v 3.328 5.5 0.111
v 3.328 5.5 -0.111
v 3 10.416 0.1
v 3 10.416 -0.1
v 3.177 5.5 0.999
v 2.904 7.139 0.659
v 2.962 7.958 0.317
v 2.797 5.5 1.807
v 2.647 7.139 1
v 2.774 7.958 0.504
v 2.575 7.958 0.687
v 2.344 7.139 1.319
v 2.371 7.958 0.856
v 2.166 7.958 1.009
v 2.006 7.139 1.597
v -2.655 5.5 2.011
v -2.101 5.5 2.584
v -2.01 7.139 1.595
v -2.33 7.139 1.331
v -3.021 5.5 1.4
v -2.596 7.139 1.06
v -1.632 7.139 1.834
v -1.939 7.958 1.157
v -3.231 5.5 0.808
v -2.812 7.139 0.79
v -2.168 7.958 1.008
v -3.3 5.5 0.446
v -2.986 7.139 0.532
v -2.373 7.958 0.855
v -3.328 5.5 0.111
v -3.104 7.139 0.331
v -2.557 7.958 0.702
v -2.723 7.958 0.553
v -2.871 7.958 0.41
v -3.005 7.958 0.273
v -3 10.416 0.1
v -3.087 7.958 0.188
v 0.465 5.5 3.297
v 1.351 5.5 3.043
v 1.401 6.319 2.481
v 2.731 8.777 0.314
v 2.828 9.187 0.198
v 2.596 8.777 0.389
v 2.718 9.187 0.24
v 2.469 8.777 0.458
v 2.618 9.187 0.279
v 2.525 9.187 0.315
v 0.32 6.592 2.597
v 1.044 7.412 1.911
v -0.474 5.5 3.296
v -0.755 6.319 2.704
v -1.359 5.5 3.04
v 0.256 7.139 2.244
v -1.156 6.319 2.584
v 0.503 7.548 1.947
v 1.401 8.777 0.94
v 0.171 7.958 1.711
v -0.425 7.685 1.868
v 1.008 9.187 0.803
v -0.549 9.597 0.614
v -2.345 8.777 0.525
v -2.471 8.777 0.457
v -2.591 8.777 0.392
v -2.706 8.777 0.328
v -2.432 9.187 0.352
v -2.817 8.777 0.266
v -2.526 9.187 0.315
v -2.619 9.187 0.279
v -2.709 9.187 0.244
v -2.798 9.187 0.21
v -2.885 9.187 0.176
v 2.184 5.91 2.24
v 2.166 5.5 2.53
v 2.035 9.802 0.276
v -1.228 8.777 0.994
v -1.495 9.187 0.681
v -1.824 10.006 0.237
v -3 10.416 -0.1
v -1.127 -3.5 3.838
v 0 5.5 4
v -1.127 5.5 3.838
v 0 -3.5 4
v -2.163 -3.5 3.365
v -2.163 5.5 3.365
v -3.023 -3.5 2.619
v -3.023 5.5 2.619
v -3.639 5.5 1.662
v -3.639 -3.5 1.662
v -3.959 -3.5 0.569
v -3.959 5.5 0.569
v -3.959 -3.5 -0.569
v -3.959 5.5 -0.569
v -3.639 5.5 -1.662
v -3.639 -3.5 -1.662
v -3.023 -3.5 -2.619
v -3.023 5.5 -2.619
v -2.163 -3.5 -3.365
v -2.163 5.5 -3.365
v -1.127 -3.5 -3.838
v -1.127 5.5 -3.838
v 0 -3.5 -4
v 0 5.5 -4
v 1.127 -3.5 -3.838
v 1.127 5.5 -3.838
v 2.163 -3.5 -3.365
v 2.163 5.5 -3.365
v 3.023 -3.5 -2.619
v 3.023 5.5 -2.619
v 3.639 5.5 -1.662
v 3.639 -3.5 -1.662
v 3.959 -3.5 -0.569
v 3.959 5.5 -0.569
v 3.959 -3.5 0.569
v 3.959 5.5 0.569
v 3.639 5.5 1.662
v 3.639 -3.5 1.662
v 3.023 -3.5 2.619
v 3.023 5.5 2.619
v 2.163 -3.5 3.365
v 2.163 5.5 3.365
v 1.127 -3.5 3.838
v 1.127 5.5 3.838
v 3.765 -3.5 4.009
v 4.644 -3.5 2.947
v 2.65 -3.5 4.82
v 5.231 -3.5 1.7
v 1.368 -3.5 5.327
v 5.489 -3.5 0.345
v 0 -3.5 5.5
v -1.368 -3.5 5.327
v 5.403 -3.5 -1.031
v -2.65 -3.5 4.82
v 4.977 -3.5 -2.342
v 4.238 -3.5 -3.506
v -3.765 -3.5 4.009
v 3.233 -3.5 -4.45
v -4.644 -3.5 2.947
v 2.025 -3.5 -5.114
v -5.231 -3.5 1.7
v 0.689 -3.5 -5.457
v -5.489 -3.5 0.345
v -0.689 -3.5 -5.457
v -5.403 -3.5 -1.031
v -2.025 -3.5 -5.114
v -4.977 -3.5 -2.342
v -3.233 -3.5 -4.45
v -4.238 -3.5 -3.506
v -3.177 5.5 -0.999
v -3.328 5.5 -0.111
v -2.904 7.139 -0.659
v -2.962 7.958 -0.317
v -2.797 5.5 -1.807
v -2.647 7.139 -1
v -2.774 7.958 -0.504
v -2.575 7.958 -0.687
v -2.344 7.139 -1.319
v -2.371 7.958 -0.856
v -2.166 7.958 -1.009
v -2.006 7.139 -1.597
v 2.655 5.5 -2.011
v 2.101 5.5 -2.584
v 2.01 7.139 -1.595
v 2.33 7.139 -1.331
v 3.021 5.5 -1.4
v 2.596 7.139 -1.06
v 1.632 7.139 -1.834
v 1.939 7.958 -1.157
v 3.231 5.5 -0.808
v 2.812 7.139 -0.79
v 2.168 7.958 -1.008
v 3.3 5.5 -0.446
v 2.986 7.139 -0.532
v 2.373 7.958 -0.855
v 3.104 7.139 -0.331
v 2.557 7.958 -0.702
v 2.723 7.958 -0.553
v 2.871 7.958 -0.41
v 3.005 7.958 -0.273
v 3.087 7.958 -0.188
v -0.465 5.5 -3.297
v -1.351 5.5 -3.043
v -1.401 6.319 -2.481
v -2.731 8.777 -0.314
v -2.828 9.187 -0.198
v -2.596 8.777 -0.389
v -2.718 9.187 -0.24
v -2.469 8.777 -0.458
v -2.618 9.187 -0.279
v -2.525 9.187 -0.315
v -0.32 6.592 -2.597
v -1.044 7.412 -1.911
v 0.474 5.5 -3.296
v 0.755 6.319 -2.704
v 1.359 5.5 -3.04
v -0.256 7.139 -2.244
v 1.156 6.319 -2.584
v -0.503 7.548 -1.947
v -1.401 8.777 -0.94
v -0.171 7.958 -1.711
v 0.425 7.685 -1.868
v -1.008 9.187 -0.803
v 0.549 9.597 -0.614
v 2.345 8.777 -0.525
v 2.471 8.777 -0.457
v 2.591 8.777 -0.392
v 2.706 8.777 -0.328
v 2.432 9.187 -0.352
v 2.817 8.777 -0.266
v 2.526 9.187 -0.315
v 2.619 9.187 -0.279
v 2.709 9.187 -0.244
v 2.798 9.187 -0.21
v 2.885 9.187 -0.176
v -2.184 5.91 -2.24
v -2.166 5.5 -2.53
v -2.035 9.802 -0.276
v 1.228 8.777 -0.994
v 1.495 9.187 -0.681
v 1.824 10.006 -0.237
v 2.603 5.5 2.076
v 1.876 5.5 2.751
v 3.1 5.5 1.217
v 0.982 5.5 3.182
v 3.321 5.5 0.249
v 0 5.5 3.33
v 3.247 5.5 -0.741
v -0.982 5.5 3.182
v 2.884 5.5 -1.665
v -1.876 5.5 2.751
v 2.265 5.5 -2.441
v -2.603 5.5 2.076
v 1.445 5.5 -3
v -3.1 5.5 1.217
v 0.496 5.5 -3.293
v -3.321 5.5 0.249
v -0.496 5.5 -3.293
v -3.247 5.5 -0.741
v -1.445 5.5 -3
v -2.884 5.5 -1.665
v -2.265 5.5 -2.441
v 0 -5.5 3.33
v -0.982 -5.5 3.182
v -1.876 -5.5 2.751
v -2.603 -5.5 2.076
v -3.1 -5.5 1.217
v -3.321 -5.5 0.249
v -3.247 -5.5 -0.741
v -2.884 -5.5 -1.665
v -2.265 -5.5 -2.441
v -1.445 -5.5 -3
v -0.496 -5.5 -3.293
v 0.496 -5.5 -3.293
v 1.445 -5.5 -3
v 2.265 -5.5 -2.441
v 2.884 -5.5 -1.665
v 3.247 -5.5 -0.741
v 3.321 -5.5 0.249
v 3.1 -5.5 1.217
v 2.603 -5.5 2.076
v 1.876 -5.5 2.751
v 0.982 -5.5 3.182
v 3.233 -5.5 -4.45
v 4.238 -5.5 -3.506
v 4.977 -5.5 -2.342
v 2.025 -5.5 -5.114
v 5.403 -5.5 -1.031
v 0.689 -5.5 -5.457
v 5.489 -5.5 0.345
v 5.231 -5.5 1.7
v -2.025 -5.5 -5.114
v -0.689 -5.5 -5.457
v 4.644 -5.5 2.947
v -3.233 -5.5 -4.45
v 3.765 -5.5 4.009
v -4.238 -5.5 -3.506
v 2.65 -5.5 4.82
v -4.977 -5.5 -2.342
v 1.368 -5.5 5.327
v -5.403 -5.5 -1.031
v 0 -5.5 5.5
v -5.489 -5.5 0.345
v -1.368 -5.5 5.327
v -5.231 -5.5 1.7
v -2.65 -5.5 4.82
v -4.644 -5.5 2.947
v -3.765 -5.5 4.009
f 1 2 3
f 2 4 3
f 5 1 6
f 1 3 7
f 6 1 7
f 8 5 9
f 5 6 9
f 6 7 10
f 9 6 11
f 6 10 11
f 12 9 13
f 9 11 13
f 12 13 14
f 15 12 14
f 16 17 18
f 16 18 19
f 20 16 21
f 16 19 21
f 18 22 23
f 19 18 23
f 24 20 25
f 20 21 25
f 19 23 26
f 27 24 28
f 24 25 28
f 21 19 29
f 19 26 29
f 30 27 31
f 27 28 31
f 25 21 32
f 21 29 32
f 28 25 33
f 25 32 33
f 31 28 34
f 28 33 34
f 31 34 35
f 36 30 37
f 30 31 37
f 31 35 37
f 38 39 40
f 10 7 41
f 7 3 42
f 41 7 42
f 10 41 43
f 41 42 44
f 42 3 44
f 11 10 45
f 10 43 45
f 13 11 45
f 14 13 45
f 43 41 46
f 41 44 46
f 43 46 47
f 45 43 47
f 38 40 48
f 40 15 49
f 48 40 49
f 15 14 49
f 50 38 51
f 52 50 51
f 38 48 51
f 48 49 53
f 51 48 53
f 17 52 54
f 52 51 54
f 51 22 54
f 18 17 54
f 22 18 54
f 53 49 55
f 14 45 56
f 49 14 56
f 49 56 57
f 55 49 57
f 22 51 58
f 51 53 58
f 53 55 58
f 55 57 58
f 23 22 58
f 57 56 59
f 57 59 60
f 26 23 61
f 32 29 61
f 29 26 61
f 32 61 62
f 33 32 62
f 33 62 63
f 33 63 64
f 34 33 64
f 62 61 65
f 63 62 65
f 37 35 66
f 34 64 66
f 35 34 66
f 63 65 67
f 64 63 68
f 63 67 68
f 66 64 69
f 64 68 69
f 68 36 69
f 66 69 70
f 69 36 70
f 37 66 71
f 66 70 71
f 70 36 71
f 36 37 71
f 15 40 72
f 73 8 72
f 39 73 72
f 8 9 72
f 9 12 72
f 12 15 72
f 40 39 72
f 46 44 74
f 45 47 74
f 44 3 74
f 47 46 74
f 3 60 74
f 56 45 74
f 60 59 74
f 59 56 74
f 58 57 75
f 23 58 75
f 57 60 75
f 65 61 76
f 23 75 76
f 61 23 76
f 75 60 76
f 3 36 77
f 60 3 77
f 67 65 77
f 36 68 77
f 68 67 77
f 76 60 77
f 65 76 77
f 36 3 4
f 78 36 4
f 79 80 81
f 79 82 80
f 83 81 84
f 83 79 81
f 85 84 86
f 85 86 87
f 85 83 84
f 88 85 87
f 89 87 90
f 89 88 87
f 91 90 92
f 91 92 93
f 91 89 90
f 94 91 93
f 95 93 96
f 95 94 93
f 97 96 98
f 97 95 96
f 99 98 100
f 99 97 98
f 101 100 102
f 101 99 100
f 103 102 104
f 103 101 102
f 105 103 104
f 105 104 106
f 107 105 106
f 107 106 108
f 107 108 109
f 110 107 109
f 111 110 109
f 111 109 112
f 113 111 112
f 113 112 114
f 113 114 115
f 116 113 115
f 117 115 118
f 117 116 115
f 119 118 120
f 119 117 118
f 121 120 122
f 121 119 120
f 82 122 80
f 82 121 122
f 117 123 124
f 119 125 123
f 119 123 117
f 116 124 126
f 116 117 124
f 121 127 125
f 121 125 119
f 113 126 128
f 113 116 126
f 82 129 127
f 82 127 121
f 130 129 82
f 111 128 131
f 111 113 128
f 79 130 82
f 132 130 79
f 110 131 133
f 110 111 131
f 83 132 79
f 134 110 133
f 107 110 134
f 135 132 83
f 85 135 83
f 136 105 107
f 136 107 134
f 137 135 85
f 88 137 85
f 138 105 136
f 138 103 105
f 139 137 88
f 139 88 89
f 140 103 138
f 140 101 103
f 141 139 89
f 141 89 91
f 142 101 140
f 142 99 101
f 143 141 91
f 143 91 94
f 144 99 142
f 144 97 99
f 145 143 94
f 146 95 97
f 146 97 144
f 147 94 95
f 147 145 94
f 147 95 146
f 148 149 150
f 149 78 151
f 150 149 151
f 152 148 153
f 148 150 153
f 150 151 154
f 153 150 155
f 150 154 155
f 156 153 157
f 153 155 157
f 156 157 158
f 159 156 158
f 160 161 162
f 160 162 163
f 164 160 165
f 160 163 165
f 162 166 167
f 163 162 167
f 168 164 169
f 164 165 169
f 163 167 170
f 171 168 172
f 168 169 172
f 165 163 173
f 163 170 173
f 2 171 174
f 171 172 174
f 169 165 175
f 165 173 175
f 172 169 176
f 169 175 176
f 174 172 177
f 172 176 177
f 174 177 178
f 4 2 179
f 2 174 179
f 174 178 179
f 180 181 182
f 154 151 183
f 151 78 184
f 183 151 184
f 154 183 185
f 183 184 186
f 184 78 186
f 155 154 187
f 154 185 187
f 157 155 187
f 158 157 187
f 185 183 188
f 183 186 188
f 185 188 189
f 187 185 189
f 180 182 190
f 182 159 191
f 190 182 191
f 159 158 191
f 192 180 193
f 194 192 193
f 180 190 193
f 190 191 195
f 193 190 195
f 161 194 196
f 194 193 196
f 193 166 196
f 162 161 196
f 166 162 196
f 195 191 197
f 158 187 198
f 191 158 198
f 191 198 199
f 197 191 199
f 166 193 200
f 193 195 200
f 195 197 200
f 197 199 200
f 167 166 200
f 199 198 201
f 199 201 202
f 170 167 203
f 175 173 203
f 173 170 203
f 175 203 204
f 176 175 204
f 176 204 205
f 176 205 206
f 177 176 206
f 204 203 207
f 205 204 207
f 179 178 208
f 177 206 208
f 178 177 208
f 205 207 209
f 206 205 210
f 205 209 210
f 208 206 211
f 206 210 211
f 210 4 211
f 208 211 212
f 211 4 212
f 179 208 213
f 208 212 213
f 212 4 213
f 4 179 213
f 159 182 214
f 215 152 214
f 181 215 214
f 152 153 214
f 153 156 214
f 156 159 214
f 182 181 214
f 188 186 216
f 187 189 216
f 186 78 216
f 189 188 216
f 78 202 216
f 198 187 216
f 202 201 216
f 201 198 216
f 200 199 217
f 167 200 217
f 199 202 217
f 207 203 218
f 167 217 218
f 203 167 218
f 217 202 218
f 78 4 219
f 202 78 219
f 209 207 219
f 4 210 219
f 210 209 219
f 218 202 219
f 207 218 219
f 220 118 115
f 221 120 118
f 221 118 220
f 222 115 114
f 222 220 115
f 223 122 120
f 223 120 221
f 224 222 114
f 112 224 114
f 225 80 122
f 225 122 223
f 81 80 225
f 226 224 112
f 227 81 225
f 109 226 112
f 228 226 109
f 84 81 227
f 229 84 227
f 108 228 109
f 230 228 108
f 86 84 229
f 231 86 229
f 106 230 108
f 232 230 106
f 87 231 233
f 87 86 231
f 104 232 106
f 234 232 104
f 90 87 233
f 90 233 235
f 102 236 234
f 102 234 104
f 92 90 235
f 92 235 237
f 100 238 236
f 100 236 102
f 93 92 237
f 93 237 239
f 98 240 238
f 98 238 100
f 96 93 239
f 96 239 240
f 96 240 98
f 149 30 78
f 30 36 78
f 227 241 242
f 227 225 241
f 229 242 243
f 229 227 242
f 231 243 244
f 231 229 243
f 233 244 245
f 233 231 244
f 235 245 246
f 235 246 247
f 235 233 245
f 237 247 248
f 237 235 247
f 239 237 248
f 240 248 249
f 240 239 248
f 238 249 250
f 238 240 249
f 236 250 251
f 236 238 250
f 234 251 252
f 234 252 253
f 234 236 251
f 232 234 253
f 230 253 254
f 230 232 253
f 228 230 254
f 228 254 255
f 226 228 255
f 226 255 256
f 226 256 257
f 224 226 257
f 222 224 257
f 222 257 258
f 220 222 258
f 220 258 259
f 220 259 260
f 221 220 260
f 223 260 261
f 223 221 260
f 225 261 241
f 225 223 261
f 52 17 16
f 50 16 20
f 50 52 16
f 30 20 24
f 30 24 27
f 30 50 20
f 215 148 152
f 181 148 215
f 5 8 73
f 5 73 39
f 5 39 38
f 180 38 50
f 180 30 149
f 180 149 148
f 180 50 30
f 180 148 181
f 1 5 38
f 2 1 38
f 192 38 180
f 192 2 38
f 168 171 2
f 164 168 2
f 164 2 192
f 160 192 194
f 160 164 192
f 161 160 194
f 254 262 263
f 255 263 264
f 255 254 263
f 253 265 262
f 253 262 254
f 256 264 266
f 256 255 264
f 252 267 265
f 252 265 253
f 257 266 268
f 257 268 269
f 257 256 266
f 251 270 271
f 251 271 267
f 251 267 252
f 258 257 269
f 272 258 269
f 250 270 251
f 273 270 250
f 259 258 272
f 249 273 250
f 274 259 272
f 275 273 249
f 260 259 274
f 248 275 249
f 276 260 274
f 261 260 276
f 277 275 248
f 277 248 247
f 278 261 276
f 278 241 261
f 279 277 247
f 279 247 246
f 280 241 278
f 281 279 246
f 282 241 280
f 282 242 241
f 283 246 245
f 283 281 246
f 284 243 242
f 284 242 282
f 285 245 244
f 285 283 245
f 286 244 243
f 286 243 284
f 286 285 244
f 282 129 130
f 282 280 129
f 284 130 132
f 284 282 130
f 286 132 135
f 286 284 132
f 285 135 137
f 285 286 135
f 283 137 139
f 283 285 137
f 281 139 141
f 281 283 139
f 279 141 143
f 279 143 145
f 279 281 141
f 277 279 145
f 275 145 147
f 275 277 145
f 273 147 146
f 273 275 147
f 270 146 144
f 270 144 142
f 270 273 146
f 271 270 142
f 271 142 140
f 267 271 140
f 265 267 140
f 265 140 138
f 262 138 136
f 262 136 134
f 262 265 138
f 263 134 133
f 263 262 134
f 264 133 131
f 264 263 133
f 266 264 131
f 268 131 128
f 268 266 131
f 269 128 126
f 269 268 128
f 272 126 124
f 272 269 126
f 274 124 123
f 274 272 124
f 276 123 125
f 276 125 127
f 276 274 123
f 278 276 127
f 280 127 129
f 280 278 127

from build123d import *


with BuildPart() as part:
    # Sketch1 → Revolve1 (revolve)
    with BuildSketch(Plane(origin=(0, 0, 0), x_dir=(0, 0, -1), z_dir=(1, 0, 0))):
        Polygon((-4, 5.5), (-4, -3.5), (-5.5, -3.5), (-5.5, -5.5), (-3.33, -5.5), (-3.33, 5.5), align=None)
    revolve(axis=Axis((0, 12.686003097, 0), (0, -1, 0)))


with BuildPart() as body_2:
    # Loft4: read off the stored shape, not the designer's step
    # Loft4: loft between two sections, ruled curve by curve
    loft4_from = [
        Edge.make_bspline([(3.32815154, 5.5, 0.110938385), (3.318911807, 5.5, 0.388130394), (3.274678471, 5.5, 0.699349139), (3.056316005, 5.5, 1.368042684), (2.880471964, 5.5, 1.726573501), (2.475279036, 5.5, 2.238126983), (2.316834304, 5.5, 2.403631028), (1.952745557, 5.5, 2.707757024), (1.747027053, 5.5, 2.846242788), (1.295902616, 5.5, 3.07796003), (1.050526711, 5.5, 3.171005139), (0.536696829, 5.5, 3.297095157), (0.268404124, 5.5, 3.33), (-0.268404124, 5.5, 3.33), (-0.536696829, 5.5, 3.297095157), (-1.050526711, 5.5, 3.171005139), (-1.295902616, 5.5, 3.07796003), (-1.747027053, 5.5, 2.846242788), (-1.952745557, 5.5, 2.707757024), (-2.316834304, 5.5, 2.403631028), (-2.475279036, 5.5, 2.238126983), (-2.880471964, 5.5, 1.726573501), (-3.056316005, 5.5, 1.368042684), (-3.274678471, 5.5, 0.699349139), (-3.318911807, 5.5, 0.388130394), (-3.32815154, 5.5, 0.110938385)], [0, 0, 0, 0, 0.125, 0.125, 0.25, 0.25, 0.3125, 0.3125, 0.375, 0.375, 0.4375, 0.4375, 0.5, 0.5, 0.5625, 0.5625, 0.625, 0.625, 0.6875, 0.6875, 0.75, 0.75, 0.875, 0.875, 1, 1, 1, 1], 3),
        Edge.make_bspline([(3.32815154, 5.5, -0.110938385), (3.329383505, 5.5, -0.07397945), (3.329999487, 5.5, -0.036989725), (3.329999487, 5.5, 0.036989725), (3.329383505, 5.5, 0.07397945), (3.32815154, 5.5, 0.110938385)], [0, 0, 0, 0, 0.5, 0.5, 1, 1, 1, 1], 3),
        Edge.make_bspline([(-3.32815154, 5.5, -0.110938385), (-3.318911807, 5.5, -0.388130394), (-3.274678471, 5.5, -0.699349139), (-3.056316005, 5.5, -1.368042684), (-2.880471964, 5.5, -1.726573501), (-2.475279036, 5.5, -2.238126983), (-2.316834304, 5.5, -2.403631028), (-1.952745557, 5.5, -2.707757024), (-1.747027053, 5.5, -2.846242788), (-1.295902616, 5.5, -3.07796003), (-1.050526711, 5.5, -3.171005139), (-0.536696829, 5.5, -3.297095157), (-0.268404124, 5.5, -3.33), (0.268404124, 5.5, -3.33), (0.536696829, 5.5, -3.297095157), (1.050526711, 5.5, -3.171005139), (1.295902616, 5.5, -3.07796003), (1.747027053, 5.5, -2.846242788), (1.952745557, 5.5, -2.707757024), (2.316834304, 5.5, -2.403631028), (2.475279036, 5.5, -2.238126983), (2.880471964, 5.5, -1.726573501), (3.056316005, 5.5, -1.368042684), (3.274678471, 5.5, -0.699349139), (3.318911807, 5.5, -0.388130394), (3.32815154, 5.5, -0.110938385)], [0, 0, 0, 0, 0.125, 0.125, 0.25, 0.25, 0.3125, 0.3125, 0.375, 0.375, 0.4375, 0.4375, 0.5, 0.5, 0.5625, 0.5625, 0.625, 0.625, 0.6875, 0.6875, 0.75, 0.75, 0.875, 0.875, 1, 1, 1, 1], 3),
        Edge.make_bspline([(-3.32815154, 5.5, 0.110938385), (-3.329383505, 5.5, 0.07397945), (-3.329999487, 5.5, 0.036989725), (-3.329999487, 5.5, -0.036989725), (-3.329383505, 5.5, -0.07397945), (-3.32815154, 5.5, -0.110938385)], [0, 0, 0, 0, 0.5, 0.5, 1, 1, 1, 1], 3),
    ]
    loft4_to = [
        Edge.make_bspline([(3, 10.416151902, 0.1), (2.75, 10.416151902, 0.1), (2.5, 10.416151902, 0.1), (2, 10.416151902, 0.1), (1.75, 10.416151902, 0.1), (1.375, 10.416151902, 0.1), (1.25, 10.416151902, 0.1), (1, 10.416151902, 0.1), (0.875, 10.416151902, 0.1), (0.625, 10.416151902, 0.1), (0.5, 10.416151902, 0.1), (0.25, 10.416151902, 0.1), (0.125, 10.416151902, 0.1), (-0.125, 10.416151902, 0.1), (-0.25, 10.416151902, 0.1), (-0.5, 10.416151902, 0.1), (-0.625, 10.416151902, 0.1), (-0.875, 10.416151902, 0.1), (-1, 10.416151902, 0.1), (-1.25, 10.416151902, 0.1), (-1.375, 10.416151902, 0.1), (-1.75, 10.416151902, 0.1), (-2, 10.416151902, 0.1), (-2.5, 10.416151902, 0.1), (-2.75, 10.416151902, 0.1), (-3, 10.416151902, 0.1)], [0, 0, 0, 0, 0.125, 0.125, 0.25, 0.25, 0.3125, 0.3125, 0.375, 0.375, 0.4375, 0.4375, 0.5, 0.5, 0.5625, 0.5625, 0.625, 0.625, 0.6875, 0.6875, 0.75, 0.75, 0.875, 0.875, 1, 1, 1, 1], 3),
        Edge.make_bspline([(3, 10.416151902, -0.1), (3, 10.416151902, -0.066666667), (3, 10.416151902, -0.033333333), (3, 10.416151902, 0.033333333), (3, 10.416151902, 0.066666667), (3, 10.416151902, 0.1)], [0, 0, 0, 0, 0.5, 0.5, 1, 1, 1, 1], 3),
        Edge.make_bspline([(-3, 10.416151902, -0.1), (-2.75, 10.416151902, -0.1), (-2.5, 10.416151902, -0.1), (-2, 10.416151902, -0.1), (-1.75, 10.416151902, -0.1), (-1.375, 10.416151902, -0.1), (-1.25, 10.416151902, -0.1), (-1, 10.416151902, -0.1), (-0.875, 10.416151902, -0.1), (-0.625, 10.416151902, -0.1), (-0.5, 10.416151902, -0.1), (-0.25, 10.416151902, -0.1), (-0.125, 10.416151902, -0.1), (0.125, 10.416151902, -0.1), (0.25, 10.416151902, -0.1), (0.5, 10.416151902, -0.1), (0.625, 10.416151902, -0.1), (0.875, 10.416151902, -0.1), (1, 10.416151902, -0.1), (1.25, 10.416151902, -0.1), (1.375, 10.416151902, -0.1), (1.75, 10.416151902, -0.1), (2, 10.416151902, -0.1), (2.5, 10.416151902, -0.1), (2.75, 10.416151902, -0.1), (3, 10.416151902, -0.1)], [0, 0, 0, 0, 0.125, 0.125, 0.25, 0.25, 0.3125, 0.3125, 0.375, 0.375, 0.4375, 0.4375, 0.5, 0.5, 0.5625, 0.5625, 0.625, 0.625, 0.6875, 0.6875, 0.75, 0.75, 0.875, 0.875, 1, 1, 1, 1], 3),
        Edge.make_bspline([(-3, 10.416151902, 0.1), (-3, 10.416151902, 0.066666667), (-3, 10.416151902, 0.033333333), (-3, 10.416151902, -0.033333333), (-3, 10.416151902, -0.066666667), (-3, 10.416151902, -0.1)], [0, 0, 0, 0, 0.5, 0.5, 1, 1, 1, 1], 3),
    ]
    loft4 = Solid(Shell([*[Face.make_surface_from_curves(loft4_from[k], loft4_to[k]) for k in range(4)], Face(Wire(loft4_from)), Face(Wire(loft4_to))]))
    add(loft4)


solid = Compound([part.part, body_2.part])
